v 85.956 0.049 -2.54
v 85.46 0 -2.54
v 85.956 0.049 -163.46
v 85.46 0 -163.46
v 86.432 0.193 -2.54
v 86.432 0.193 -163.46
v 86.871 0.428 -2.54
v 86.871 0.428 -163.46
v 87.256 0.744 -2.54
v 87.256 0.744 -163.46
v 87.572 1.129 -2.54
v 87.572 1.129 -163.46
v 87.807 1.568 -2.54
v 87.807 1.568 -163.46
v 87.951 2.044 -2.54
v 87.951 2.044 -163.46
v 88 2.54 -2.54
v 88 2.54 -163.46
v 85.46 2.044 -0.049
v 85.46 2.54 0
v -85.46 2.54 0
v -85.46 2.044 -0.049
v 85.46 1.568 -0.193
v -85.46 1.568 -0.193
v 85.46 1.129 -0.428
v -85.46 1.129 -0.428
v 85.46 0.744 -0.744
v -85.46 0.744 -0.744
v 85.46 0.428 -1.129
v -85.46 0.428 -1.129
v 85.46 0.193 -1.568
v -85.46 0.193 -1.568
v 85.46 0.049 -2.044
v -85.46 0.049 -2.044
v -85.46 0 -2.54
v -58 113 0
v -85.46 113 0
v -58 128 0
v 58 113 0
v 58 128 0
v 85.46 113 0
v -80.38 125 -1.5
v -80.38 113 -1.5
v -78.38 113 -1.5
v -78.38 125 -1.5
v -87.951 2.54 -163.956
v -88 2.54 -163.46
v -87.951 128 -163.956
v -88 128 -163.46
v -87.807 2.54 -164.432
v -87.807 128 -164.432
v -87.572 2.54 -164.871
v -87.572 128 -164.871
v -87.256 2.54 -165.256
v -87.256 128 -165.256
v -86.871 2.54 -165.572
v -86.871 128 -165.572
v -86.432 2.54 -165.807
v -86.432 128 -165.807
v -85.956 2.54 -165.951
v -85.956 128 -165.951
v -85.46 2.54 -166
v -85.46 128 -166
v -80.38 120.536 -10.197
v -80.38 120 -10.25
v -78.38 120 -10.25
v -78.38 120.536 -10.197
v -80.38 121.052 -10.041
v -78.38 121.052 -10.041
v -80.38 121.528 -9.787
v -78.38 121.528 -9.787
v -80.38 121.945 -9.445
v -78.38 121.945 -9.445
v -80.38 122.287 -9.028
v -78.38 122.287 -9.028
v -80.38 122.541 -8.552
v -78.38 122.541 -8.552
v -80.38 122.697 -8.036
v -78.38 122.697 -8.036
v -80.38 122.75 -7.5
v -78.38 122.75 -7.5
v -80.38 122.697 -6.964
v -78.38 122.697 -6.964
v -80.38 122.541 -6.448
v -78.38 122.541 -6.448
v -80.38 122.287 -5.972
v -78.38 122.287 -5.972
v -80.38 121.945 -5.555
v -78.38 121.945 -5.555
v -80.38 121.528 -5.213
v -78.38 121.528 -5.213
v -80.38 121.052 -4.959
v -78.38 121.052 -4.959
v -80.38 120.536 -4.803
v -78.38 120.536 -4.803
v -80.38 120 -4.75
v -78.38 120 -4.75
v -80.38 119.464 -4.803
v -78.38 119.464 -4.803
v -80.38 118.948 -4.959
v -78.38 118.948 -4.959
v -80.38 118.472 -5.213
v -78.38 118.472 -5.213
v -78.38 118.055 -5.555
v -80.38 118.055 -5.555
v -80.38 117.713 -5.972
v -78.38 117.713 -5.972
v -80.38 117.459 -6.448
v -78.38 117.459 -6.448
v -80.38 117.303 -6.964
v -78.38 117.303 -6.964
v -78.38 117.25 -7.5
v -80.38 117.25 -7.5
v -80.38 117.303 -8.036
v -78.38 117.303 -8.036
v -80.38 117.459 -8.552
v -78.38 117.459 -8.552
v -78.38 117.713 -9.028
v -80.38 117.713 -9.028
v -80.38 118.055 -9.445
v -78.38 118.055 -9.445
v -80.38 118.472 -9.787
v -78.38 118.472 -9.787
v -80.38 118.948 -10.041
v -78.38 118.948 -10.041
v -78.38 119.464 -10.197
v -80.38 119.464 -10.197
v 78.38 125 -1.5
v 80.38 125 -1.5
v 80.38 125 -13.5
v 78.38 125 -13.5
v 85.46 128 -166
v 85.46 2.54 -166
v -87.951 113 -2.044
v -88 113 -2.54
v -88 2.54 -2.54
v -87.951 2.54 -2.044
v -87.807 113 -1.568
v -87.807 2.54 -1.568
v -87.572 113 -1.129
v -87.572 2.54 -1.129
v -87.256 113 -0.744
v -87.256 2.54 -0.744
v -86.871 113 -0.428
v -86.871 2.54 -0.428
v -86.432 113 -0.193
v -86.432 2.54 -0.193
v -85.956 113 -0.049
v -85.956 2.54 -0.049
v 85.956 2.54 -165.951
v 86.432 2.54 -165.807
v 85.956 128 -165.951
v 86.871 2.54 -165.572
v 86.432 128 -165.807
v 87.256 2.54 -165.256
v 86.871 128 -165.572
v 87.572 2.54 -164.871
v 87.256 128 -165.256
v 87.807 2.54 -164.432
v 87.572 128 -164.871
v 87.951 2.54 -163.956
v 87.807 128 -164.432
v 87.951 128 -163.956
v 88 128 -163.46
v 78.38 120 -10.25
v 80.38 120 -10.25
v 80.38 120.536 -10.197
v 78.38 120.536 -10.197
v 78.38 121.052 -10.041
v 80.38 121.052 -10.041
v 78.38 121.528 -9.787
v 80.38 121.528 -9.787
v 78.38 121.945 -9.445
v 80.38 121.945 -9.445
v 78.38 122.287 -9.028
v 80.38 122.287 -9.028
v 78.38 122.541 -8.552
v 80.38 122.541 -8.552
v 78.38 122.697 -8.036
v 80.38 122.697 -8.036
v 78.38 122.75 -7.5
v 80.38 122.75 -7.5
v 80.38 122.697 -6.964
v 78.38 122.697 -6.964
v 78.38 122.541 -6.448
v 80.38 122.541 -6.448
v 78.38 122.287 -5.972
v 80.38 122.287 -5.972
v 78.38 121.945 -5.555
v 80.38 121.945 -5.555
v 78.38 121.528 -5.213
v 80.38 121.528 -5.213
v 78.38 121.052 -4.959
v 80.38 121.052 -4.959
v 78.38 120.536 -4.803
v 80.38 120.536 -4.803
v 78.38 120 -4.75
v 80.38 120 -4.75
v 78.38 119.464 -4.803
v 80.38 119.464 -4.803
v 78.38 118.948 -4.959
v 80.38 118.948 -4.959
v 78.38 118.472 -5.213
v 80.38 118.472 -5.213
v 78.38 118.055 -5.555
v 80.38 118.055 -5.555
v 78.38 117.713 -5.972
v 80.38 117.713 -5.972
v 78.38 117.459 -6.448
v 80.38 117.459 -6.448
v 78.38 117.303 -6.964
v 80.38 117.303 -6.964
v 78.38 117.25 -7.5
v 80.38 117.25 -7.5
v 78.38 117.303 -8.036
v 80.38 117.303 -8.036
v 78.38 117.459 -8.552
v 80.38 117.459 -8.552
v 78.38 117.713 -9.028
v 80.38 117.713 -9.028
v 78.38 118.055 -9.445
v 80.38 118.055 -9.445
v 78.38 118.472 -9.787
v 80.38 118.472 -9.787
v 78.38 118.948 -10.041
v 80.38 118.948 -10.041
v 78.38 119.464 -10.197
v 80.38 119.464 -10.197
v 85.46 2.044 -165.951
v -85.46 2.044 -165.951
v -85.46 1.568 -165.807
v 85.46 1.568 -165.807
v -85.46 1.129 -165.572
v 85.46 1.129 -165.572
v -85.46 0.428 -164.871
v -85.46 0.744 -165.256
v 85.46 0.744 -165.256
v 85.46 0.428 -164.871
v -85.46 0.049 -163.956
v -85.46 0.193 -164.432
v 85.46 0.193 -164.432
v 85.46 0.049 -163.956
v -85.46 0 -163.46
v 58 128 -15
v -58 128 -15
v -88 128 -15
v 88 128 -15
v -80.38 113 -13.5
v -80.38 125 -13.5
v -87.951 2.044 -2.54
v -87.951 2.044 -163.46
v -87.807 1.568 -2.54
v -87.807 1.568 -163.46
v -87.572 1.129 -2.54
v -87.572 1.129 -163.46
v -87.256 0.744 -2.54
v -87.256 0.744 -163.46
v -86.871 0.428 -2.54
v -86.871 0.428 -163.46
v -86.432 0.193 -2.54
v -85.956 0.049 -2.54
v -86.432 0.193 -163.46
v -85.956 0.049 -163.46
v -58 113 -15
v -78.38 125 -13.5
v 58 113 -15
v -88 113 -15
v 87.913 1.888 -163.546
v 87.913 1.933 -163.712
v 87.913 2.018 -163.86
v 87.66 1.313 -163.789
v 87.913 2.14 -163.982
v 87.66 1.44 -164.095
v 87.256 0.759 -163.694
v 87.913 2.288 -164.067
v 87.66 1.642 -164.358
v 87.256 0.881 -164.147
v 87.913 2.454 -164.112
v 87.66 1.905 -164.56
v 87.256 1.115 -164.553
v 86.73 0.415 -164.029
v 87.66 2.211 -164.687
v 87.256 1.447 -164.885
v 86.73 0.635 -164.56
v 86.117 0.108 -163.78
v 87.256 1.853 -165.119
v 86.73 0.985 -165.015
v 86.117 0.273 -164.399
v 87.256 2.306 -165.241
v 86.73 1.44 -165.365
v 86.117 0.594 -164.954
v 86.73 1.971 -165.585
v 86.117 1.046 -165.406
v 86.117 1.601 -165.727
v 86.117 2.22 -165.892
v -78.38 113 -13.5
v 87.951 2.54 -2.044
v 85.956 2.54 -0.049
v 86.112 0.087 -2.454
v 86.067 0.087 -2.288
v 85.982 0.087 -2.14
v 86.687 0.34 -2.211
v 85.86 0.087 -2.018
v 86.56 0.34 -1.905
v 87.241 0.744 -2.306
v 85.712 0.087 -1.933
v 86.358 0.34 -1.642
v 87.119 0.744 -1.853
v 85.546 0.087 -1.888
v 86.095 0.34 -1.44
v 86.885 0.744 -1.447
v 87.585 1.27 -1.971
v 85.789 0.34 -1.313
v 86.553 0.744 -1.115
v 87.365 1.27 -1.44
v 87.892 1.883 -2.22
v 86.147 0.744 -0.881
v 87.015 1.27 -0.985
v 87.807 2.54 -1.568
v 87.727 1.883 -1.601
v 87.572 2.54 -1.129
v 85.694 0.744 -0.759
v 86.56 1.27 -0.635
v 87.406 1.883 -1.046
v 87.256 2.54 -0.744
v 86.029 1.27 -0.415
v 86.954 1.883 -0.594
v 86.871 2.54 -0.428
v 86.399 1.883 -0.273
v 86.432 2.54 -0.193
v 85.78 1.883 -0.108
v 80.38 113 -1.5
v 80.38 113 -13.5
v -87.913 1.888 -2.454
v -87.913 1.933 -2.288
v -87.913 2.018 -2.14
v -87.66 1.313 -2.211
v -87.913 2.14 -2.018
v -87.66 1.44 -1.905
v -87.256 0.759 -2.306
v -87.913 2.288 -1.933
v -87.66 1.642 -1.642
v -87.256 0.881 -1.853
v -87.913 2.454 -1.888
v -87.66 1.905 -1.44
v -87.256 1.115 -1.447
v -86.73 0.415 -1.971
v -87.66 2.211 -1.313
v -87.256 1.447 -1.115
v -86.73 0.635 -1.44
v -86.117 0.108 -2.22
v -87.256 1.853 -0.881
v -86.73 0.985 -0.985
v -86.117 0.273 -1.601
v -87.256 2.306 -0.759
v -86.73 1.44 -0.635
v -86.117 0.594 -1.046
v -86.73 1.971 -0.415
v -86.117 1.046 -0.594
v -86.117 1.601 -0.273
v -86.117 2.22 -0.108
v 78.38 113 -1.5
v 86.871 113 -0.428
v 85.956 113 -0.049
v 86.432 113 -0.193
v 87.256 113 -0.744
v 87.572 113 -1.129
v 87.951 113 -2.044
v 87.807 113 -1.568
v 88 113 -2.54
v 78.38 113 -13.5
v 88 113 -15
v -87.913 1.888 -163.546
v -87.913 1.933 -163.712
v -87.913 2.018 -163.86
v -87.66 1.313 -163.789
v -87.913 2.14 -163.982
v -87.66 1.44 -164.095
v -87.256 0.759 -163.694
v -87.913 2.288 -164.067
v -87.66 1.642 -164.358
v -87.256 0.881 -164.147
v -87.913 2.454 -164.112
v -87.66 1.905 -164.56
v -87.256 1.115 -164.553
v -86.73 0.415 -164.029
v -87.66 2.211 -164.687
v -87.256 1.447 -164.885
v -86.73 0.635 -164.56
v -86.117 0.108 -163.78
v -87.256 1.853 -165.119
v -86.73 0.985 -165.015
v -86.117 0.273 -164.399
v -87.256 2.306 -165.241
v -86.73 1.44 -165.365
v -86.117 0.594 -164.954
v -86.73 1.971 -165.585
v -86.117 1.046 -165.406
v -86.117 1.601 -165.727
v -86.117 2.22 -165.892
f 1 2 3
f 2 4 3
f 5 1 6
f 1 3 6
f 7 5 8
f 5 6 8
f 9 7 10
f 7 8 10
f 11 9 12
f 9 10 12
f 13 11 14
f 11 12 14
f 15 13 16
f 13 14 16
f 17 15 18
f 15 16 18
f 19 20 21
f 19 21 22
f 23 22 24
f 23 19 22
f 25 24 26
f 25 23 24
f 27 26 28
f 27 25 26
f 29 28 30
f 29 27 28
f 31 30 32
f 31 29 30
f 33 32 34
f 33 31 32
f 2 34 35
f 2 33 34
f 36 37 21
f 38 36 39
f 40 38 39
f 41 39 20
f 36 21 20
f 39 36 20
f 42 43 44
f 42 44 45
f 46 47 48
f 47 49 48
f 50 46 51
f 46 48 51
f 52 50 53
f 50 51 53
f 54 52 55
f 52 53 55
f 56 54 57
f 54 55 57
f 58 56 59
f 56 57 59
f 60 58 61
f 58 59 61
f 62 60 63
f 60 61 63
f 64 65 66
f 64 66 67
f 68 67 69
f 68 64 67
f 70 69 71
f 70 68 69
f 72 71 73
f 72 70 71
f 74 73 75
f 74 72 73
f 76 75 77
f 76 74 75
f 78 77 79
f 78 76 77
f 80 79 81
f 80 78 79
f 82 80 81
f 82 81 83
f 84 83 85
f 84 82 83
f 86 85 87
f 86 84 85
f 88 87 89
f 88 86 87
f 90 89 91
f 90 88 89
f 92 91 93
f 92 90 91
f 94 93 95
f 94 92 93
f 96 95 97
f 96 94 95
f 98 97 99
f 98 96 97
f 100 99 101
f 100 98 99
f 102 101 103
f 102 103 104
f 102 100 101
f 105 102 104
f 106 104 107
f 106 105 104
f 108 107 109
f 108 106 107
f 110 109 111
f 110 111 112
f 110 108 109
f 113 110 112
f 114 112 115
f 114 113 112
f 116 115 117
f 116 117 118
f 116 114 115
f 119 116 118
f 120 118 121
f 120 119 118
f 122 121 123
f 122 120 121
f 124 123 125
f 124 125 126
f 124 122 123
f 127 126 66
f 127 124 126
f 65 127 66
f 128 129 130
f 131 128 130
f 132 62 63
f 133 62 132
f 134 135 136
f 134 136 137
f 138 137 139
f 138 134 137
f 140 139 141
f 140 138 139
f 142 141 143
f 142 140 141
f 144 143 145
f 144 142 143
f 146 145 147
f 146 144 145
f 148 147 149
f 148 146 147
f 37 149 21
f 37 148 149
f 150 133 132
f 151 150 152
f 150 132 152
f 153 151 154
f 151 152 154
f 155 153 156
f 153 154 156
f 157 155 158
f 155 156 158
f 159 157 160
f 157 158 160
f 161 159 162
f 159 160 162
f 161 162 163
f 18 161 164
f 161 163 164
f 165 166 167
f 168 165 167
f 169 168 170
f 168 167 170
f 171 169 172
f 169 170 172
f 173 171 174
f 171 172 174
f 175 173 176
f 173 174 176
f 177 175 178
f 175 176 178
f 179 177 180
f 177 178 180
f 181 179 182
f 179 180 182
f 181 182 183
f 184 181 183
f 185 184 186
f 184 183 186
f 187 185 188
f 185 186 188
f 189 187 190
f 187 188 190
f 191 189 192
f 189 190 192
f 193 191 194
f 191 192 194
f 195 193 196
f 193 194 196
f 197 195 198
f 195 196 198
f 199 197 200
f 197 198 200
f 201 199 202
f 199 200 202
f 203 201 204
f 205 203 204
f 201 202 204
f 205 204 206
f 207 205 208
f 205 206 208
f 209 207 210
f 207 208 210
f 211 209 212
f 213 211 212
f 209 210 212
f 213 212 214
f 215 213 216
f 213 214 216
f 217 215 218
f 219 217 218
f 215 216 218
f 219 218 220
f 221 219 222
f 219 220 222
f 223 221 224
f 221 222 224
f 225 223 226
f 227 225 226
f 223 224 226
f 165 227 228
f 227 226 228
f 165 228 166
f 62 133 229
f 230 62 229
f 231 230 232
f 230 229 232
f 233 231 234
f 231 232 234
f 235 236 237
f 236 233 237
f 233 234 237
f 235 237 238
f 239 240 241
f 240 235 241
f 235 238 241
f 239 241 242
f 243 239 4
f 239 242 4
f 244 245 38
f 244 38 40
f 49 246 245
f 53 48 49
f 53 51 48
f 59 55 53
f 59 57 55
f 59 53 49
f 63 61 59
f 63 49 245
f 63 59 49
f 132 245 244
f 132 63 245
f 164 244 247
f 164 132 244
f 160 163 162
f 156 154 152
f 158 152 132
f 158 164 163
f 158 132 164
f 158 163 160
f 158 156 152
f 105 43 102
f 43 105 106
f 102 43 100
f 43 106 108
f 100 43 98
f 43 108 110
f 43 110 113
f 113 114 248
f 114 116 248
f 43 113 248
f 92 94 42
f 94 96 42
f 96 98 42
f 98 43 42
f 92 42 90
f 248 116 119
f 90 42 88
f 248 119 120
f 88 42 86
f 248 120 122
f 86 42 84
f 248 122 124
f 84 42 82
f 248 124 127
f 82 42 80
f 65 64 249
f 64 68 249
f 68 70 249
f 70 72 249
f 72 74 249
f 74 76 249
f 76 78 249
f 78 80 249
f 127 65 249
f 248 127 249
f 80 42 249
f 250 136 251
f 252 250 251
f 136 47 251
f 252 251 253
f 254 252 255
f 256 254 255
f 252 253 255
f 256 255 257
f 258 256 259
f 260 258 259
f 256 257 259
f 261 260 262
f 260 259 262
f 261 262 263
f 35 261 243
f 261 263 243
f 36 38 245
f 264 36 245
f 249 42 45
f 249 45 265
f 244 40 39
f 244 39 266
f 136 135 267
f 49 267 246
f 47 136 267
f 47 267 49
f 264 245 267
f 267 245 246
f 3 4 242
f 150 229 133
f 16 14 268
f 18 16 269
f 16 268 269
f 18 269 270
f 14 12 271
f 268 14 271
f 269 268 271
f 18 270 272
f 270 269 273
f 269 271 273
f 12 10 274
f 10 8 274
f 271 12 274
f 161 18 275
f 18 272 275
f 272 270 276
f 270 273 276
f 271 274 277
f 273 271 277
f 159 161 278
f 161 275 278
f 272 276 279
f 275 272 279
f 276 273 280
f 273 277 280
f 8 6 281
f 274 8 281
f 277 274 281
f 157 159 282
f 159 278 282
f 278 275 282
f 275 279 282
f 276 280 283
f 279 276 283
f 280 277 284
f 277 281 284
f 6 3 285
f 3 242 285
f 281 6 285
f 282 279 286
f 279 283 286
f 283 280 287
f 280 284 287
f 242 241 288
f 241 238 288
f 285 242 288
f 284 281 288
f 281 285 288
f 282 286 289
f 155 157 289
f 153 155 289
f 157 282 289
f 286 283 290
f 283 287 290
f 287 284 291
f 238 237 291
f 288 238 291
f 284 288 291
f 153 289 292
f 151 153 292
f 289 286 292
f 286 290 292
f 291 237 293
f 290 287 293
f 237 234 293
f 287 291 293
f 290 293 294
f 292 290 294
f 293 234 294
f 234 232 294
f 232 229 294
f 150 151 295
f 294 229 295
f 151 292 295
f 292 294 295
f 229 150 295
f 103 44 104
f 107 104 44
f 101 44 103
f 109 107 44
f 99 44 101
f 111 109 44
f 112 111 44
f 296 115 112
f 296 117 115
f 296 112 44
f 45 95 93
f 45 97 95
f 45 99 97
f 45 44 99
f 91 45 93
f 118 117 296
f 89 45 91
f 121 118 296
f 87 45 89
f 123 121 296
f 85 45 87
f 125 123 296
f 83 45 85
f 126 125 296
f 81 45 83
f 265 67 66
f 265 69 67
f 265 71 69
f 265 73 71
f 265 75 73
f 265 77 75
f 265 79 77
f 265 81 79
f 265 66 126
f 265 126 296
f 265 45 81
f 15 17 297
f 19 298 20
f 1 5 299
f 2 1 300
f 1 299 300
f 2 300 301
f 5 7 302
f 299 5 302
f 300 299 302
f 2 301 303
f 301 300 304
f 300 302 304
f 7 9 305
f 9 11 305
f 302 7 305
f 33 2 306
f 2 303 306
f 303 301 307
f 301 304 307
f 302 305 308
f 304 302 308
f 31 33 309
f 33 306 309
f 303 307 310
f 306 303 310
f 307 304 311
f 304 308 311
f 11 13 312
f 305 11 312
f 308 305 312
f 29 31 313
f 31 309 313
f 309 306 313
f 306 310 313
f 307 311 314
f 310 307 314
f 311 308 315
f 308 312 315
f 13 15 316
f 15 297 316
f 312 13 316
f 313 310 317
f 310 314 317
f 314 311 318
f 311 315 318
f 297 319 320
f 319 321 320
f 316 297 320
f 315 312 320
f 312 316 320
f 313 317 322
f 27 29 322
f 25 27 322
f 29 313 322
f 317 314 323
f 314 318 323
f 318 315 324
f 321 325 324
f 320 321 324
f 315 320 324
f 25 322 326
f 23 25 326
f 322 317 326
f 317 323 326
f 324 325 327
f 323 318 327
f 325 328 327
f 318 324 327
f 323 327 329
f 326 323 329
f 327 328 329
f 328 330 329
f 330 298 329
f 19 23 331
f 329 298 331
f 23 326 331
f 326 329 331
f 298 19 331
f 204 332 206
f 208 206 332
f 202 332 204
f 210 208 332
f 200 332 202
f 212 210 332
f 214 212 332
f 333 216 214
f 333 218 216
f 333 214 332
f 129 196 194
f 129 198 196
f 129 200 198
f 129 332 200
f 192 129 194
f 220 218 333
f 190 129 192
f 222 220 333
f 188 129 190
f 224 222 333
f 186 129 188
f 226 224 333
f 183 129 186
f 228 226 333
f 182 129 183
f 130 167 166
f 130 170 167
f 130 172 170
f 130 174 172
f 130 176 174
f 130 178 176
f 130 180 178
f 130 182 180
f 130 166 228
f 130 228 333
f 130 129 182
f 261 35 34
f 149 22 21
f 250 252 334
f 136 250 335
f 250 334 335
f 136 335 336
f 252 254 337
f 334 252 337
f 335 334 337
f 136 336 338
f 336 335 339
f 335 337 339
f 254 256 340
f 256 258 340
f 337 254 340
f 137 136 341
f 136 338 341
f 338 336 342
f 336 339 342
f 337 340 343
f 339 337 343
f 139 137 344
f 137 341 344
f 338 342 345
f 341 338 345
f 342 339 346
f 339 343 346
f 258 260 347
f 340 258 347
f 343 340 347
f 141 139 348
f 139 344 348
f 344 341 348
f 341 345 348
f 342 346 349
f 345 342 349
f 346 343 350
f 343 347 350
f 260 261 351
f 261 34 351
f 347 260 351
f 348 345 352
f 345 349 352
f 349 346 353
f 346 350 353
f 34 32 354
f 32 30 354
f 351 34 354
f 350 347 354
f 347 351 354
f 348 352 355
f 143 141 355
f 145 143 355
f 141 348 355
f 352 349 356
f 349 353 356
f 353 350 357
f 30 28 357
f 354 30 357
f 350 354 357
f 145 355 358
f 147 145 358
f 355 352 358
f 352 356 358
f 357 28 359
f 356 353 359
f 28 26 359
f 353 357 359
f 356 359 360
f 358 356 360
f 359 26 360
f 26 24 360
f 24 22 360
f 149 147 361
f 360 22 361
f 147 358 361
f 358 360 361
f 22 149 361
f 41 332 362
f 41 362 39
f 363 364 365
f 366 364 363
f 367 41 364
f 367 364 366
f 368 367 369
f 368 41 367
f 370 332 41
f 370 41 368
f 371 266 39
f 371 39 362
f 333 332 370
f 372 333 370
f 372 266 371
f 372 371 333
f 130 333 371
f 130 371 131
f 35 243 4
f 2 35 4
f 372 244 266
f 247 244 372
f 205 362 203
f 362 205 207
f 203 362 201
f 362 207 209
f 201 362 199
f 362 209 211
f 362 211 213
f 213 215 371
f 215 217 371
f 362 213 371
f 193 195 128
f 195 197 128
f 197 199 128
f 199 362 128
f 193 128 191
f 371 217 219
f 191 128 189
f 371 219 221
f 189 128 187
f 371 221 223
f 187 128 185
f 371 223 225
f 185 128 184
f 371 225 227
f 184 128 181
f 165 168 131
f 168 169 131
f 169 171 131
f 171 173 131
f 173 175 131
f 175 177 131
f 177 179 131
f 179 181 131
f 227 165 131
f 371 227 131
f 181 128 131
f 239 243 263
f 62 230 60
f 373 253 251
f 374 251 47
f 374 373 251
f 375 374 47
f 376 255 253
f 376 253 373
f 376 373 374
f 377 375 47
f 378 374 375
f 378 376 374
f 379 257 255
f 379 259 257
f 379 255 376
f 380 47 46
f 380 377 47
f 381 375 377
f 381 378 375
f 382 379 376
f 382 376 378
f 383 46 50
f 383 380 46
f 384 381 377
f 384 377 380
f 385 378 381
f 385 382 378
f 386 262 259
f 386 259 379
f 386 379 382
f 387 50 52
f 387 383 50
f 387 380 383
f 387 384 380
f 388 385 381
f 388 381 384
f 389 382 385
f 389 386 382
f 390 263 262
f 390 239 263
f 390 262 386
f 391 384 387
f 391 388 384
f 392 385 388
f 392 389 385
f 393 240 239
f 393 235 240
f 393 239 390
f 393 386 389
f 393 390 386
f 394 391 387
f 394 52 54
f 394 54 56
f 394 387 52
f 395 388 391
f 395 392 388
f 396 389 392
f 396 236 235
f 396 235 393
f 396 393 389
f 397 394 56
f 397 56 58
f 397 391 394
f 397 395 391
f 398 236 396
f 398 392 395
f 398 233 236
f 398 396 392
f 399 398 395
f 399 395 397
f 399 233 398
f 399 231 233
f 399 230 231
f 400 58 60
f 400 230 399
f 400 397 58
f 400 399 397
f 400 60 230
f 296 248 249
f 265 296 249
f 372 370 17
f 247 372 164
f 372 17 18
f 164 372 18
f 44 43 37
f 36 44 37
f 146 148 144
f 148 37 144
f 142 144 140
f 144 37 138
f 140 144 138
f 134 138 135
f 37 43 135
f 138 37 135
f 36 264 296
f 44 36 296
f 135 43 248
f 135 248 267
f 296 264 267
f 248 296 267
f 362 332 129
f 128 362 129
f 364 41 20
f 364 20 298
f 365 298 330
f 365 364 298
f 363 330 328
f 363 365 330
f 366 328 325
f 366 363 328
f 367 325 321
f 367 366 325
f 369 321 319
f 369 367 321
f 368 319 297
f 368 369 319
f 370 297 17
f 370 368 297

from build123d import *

# Parameters (mm, degrees)
SKETCH1_W           = 176
SKETCH1_H           = 166
BOSS_EXTRUDE1_DEPTH = 128
SKETCH3_W           = 30
SKETCH3_H           = 15
CUT_EXTRUDE1_DEPTH  = 15
FILLET1_R           = 2.54
SKETCH4_W           = 12
SKETCH4_H           = 12
SKETCH4_R           = 2.75
BOSS_EXTRUDE2_DEPTH = 2


with BuildPart() as part:
    # Sketch1 → Boss-Extrude1 (new body)
    with BuildSketch(Plane(origin=(0, 0, 0), x_dir=(1, 0, 0), z_dir=(0, 1, 0))):
        with Locations((0, 83)):
            Rectangle(SKETCH1_W, SKETCH1_H)
    extrude(amount=BOSS_EXTRUDE1_DEPTH)

    # Sketch3 → Cut-Extrude1 (cut)
    with BuildSketch(Plane(origin=(0, 128, 0), x_dir=(1, 0, 0), z_dir=(0, 1, 0))):
        with Locations((73, 7.5)):
            Rectangle(SKETCH3_W, SKETCH3_H)
    cut_extrude1 = extrude(amount=-CUT_EXTRUDE1_DEPTH, mode=Mode.SUBTRACT)

    # Fillet1
    fillet1_edges = [part.edges().sort_by_distance(p)[0] for p in [
        (88, 56.5, 0),
        (0, 0, -166),
        (88, 0, -83),
        (0, 0, 0),
        (-88, 0, -83),
        (-88, 64, -166),
        (88, 64, -166),
        (-88, 64, 0),
    ]]
    fillet(fillet1_edges, radius=FILLET1_R)

    # Sketch4 → Boss-Extrude2 (add)
    with BuildSketch(Plane(origin=(80.38, 0, 0), x_dir=(0, 0, -1), z_dir=(1, 0, 0))):
        with Locations((7.5, 119)):
            Rectangle(SKETCH4_W, SKETCH4_H)
        with Locations((7.5, 120)):
            Circle(SKETCH4_R, mode=Mode.SUBTRACT)
    boss_extrude2 = extrude(amount=-BOSS_EXTRUDE2_DEPTH)

    # Mirror2: Cut-Extrude1, Boss-Extrude2 across plane
    add(cut_extrude1.mirror(Plane(origin=(0, 0, 0), x_dir=(0, 0, 1), z_dir=(1, 0, 0))), mode=Mode.SUBTRACT)
    add(boss_extrude2.mirror(Plane(origin=(0, 0, 0), x_dir=(0, 0, 1), z_dir=(1, 0, 0))))


solid = part.part
